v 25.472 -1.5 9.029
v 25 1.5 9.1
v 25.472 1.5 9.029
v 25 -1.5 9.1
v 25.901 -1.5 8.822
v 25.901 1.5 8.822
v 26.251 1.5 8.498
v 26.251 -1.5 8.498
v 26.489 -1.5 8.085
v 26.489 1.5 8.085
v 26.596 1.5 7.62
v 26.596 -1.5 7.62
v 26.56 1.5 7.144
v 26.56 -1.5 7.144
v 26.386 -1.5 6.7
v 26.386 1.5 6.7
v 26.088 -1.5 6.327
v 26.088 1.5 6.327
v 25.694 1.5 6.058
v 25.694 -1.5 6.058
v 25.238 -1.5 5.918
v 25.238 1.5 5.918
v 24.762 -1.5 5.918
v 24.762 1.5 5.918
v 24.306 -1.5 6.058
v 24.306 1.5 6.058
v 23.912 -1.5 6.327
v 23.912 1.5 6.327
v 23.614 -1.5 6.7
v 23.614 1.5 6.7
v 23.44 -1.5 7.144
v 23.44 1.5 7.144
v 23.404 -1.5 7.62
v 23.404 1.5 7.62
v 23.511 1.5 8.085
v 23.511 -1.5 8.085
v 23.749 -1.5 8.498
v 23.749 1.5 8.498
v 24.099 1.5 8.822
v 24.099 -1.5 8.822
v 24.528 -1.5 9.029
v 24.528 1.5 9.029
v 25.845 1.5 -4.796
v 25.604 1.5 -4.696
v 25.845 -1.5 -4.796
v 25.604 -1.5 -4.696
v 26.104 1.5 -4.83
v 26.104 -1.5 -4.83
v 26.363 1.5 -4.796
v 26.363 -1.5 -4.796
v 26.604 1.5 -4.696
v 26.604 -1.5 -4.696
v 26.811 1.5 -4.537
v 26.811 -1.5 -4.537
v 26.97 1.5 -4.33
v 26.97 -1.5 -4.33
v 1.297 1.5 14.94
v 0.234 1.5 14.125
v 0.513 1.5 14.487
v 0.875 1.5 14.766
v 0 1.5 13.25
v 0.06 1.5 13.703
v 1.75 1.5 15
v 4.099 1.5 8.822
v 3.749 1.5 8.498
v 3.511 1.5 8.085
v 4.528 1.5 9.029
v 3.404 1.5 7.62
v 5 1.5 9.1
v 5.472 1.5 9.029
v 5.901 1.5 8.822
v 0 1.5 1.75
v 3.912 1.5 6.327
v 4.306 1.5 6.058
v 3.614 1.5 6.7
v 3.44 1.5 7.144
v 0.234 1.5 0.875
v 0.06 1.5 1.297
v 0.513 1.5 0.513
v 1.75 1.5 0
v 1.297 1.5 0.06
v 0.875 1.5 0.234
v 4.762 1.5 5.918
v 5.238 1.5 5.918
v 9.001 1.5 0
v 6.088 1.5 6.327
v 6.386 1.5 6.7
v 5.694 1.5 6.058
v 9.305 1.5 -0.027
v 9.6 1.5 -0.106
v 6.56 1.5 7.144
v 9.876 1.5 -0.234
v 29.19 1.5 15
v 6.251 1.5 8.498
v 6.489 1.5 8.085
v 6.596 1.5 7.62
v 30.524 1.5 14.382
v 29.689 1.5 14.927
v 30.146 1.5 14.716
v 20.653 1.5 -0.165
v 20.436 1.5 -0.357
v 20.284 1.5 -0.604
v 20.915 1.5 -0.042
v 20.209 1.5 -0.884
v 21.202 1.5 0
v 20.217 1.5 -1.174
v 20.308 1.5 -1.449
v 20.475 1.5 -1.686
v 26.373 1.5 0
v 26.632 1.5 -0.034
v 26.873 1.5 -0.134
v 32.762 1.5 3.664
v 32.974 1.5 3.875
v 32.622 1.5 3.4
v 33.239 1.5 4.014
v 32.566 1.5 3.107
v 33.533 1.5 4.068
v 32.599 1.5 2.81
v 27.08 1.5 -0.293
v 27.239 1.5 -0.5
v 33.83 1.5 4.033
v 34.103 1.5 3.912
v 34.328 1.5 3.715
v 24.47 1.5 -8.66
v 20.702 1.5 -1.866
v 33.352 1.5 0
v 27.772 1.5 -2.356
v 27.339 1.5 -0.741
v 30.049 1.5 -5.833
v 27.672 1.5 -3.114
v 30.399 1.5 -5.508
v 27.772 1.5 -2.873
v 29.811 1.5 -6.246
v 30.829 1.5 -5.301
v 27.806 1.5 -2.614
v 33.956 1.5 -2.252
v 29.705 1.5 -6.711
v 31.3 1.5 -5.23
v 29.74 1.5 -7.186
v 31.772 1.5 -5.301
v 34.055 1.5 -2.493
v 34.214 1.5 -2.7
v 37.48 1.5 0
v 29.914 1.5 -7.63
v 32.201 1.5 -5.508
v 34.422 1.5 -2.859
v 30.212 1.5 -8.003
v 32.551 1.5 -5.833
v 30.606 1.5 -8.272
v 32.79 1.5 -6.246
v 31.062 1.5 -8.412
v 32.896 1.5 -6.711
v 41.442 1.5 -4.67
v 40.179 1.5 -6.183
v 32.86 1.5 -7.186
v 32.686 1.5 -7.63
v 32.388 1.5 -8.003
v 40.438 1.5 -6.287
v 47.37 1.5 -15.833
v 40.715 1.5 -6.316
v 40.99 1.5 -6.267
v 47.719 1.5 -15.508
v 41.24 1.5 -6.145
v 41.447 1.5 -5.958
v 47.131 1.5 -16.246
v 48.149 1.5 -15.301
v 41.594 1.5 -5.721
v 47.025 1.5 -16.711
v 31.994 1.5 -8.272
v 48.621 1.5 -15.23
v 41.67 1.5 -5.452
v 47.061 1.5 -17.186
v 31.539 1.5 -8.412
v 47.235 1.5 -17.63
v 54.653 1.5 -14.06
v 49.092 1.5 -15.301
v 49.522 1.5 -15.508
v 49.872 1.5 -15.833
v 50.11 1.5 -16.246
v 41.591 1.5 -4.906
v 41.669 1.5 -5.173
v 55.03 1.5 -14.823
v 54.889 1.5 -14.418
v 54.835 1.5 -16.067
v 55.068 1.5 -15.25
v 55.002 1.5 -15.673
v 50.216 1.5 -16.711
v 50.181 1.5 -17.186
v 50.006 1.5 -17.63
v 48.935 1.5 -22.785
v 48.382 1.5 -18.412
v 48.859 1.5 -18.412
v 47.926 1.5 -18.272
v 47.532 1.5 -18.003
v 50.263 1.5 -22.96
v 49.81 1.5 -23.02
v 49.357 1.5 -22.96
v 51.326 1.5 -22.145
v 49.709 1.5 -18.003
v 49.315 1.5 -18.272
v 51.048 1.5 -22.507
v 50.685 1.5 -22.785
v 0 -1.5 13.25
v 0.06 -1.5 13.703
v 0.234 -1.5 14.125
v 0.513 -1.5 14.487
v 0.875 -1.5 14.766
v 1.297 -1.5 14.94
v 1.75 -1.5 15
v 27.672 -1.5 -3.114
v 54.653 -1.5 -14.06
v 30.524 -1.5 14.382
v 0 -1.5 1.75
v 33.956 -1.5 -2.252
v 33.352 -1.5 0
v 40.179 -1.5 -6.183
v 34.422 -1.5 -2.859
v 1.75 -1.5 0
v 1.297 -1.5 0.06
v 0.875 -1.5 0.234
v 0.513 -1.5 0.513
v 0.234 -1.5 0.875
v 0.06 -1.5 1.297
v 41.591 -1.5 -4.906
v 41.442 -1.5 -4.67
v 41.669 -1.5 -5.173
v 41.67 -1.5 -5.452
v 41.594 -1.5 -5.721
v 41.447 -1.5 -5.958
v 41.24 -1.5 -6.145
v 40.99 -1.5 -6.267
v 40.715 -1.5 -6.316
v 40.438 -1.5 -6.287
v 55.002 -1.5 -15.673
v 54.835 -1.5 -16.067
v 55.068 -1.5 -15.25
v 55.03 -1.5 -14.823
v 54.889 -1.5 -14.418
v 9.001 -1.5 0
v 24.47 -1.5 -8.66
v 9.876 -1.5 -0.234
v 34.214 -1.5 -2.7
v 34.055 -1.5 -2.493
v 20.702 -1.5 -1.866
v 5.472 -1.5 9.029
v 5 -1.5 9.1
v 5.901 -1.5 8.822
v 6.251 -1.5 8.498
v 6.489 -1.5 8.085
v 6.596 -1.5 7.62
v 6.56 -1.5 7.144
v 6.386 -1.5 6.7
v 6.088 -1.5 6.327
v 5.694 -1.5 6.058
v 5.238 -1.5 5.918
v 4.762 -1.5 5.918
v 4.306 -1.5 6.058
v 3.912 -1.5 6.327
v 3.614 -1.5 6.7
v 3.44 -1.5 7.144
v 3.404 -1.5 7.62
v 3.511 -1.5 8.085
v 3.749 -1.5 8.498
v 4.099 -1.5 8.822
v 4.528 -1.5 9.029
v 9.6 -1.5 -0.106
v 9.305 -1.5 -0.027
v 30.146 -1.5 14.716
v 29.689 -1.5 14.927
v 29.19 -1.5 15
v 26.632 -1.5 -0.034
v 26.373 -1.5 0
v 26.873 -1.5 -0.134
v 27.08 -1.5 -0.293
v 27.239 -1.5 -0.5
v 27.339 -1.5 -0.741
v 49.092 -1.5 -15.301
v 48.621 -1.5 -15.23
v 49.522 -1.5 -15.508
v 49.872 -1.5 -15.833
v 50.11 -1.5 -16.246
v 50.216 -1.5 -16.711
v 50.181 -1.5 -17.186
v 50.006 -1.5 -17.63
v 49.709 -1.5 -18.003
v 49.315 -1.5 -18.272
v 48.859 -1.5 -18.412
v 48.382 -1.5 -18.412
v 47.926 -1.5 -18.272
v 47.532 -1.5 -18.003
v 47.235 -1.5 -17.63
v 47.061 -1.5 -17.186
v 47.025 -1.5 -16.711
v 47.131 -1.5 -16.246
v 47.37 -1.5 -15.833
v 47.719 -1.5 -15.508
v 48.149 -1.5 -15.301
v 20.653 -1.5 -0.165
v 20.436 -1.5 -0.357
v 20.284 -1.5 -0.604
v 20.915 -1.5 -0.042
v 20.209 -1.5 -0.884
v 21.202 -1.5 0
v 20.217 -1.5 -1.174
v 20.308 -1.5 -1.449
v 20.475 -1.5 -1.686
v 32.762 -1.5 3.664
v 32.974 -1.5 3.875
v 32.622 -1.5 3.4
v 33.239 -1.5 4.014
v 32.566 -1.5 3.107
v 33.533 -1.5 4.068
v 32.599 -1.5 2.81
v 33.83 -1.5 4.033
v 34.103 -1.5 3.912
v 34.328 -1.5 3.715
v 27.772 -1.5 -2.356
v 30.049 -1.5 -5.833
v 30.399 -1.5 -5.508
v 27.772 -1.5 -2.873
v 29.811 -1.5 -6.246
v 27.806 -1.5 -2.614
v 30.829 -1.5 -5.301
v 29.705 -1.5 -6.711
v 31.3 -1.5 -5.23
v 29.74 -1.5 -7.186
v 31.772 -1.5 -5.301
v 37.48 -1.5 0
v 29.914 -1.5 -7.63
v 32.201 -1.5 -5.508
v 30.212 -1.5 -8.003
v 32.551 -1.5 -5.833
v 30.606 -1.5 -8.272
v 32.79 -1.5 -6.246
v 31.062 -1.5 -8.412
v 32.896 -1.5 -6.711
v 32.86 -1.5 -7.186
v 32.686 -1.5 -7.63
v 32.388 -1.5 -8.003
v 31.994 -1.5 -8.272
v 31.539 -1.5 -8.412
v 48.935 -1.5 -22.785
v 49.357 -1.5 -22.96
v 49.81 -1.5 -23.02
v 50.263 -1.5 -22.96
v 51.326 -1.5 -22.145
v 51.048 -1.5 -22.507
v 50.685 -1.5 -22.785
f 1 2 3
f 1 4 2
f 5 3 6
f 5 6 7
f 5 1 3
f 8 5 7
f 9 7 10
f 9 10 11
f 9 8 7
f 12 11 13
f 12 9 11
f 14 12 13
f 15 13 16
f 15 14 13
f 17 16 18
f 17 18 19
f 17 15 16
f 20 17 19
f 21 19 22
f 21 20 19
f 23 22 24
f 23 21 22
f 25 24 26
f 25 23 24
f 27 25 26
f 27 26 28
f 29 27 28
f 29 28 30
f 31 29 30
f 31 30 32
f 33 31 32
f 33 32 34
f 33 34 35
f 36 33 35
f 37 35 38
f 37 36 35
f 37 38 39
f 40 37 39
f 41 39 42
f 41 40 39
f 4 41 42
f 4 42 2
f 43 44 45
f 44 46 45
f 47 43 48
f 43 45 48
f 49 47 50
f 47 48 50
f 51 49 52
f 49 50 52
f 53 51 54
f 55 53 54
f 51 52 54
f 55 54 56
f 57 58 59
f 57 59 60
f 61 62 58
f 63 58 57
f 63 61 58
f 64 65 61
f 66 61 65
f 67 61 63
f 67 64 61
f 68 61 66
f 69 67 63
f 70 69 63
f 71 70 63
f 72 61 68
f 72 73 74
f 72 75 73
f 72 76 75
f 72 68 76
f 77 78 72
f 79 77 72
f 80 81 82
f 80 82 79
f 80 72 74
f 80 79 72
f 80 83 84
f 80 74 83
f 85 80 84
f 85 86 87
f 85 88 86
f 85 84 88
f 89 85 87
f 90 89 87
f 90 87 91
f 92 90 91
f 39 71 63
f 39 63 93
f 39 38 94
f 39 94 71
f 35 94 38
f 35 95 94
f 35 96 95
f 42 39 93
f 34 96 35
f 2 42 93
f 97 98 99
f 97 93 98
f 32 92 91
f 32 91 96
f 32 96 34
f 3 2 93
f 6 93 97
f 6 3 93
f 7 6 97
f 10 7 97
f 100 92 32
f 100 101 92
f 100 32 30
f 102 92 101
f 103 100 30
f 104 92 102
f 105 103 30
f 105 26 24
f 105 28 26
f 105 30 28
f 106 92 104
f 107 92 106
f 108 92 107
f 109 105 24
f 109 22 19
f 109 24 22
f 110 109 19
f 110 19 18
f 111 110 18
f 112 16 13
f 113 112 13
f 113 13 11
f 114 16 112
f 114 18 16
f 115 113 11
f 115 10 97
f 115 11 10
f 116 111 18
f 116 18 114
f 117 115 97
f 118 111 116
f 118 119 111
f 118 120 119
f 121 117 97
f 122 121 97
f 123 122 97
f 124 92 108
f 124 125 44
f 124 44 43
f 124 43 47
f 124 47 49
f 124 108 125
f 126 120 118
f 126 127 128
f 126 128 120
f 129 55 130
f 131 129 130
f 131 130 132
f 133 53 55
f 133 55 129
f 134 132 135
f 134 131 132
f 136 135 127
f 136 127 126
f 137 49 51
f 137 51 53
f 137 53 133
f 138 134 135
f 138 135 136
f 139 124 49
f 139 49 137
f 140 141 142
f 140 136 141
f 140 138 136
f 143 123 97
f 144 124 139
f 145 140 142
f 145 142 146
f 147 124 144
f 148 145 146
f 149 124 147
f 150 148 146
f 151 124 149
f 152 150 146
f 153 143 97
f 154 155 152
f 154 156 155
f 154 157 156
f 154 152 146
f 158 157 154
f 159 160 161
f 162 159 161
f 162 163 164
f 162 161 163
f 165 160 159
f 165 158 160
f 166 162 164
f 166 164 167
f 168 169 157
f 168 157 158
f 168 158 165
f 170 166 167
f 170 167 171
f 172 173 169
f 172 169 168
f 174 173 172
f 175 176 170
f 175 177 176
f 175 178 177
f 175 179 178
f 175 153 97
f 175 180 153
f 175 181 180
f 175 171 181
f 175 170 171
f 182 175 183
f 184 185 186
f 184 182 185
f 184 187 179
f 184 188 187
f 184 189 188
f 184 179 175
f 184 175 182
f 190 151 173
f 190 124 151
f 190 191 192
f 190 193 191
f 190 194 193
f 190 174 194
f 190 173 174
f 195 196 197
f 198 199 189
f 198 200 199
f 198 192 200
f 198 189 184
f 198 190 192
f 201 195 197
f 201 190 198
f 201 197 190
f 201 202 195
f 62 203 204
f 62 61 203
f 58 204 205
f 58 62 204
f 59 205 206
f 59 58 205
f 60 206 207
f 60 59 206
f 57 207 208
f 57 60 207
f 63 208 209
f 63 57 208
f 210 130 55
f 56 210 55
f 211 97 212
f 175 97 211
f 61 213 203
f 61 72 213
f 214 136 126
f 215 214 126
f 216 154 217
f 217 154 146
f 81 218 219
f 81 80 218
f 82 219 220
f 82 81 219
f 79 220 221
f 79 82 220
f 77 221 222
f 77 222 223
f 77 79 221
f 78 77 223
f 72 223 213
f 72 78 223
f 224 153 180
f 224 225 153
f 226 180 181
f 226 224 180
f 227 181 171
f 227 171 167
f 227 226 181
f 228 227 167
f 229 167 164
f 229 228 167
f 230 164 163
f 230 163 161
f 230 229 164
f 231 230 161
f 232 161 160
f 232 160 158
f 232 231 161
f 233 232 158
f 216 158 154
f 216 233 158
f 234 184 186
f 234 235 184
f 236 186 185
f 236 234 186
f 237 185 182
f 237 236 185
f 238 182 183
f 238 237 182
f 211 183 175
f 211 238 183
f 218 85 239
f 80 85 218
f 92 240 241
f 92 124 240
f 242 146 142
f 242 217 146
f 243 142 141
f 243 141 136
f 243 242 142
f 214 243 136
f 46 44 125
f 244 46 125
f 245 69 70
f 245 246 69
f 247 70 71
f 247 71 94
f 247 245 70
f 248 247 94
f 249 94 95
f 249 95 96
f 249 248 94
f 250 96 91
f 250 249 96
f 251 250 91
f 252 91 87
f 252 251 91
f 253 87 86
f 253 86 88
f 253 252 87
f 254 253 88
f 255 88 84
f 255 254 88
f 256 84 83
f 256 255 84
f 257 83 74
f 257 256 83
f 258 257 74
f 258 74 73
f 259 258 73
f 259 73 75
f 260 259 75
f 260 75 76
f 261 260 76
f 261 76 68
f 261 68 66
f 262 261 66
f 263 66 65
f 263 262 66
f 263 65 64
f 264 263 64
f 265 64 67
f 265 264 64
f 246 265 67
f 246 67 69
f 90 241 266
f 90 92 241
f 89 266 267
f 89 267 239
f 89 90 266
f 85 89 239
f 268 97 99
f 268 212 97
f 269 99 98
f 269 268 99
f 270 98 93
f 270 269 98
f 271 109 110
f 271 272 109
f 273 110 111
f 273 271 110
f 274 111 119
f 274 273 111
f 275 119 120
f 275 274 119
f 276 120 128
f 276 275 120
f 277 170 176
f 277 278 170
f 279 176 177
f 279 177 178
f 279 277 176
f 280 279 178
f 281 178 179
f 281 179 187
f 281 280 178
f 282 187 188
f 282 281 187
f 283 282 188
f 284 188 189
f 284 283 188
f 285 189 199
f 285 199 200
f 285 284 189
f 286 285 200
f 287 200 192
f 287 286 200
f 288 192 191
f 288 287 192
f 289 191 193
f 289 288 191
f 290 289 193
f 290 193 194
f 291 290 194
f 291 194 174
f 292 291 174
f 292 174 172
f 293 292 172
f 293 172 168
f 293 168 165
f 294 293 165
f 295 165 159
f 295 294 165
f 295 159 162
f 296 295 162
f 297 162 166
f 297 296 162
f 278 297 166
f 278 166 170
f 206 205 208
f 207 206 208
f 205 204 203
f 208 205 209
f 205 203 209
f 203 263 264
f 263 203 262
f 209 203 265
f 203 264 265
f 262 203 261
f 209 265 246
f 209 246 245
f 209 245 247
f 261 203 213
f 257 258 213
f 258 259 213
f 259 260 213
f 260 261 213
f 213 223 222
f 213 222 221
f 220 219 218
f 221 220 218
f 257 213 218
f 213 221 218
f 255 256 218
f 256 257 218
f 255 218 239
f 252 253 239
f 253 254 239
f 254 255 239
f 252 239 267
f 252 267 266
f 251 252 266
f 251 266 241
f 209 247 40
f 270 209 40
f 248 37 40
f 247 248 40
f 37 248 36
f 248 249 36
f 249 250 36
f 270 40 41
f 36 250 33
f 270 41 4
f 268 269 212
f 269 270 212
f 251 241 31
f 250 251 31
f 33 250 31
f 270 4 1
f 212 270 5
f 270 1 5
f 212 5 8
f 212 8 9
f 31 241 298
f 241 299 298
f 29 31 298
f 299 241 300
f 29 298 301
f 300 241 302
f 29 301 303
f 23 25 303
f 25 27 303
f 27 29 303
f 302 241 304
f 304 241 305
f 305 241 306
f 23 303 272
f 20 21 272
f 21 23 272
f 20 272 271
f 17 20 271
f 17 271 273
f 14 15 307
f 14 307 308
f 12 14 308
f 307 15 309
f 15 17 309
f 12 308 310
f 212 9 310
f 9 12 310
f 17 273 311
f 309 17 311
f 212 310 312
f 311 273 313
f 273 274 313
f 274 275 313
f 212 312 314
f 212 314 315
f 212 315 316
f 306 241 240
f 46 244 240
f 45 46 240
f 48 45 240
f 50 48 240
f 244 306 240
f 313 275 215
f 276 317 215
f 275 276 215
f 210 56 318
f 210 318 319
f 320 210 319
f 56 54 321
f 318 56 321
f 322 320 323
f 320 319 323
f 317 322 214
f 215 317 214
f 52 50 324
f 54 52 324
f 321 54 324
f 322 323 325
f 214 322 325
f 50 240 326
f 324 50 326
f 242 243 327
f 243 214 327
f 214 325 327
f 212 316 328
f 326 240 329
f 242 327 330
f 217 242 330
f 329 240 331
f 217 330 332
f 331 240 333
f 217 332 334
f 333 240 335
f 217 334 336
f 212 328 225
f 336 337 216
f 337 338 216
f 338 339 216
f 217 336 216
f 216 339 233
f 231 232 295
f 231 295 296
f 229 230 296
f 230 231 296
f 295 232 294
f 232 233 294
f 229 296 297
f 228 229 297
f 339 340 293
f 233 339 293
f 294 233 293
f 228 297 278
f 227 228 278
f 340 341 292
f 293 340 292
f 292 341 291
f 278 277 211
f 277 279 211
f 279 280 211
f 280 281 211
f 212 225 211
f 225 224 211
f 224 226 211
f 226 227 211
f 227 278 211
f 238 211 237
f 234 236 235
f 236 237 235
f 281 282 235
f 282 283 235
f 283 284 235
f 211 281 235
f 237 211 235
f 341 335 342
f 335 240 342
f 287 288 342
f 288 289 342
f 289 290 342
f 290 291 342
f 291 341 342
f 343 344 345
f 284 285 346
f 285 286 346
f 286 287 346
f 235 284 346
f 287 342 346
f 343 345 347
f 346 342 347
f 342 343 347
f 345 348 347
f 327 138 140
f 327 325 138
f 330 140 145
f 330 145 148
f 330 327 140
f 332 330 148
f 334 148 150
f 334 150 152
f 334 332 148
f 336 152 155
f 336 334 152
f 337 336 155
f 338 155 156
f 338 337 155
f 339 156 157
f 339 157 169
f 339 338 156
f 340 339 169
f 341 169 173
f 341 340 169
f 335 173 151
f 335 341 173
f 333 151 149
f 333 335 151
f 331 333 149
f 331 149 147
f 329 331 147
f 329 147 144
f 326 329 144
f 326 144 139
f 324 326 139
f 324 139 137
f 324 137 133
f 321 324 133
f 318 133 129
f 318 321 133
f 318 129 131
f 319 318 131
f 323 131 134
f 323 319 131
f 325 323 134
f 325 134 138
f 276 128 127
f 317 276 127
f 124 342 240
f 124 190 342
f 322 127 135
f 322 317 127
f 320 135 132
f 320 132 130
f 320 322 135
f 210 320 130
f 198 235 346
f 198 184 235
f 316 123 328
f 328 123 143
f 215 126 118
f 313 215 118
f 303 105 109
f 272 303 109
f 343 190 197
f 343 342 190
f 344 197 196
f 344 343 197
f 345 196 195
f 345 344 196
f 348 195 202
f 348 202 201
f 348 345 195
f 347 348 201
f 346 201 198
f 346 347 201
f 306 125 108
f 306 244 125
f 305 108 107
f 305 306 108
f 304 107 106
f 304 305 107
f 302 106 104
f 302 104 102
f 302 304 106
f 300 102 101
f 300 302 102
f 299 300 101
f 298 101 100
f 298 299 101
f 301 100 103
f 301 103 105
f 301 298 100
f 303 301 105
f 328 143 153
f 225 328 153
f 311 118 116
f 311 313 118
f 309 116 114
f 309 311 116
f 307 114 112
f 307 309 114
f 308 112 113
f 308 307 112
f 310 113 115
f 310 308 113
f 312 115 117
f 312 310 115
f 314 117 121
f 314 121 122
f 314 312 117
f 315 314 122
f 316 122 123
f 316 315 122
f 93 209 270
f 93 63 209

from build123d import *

# Parameters (mm, degrees)
SKETCH_2_R          = 1.6
EXTRUDE_1_DEPTH     = 1.5
CUT_EXTRUDE_1_DEPTH = 3
FILLET_1_R          = 1
FILLET_2_R          = 1.75


with BuildPart() as part:
    # ｽｹｯﾁ2 → ﾎﾞｽ - 押し出し1 (new, symmetric)
    with BuildSketch(Plane(origin=(0, 0, 0), x_dir=(1, 0, 0), z_dir=(0, 1, 0))):
        Polygon((24.47, 8.660254038), (9.47, 0), (0, 0), (0, -15), (30, -15), (55.450762114, 15), (50.450762114, 23.660254038), align=None)
        with Locations(Location((48.620635095, 16.830127019, 0), (0, 0, 270))):
            Circle(SKETCH_2_R, mode=Mode.SUBTRACT)
        with Locations(Location((25, -7.5, 0), (0, 0, 270))):
            Circle(SKETCH_2_R, mode=Mode.SUBTRACT)
        with Locations(Location((31.300127019, 6.830127019, 0), (0, 0, 270))):
            Circle(SKETCH_2_R, mode=Mode.SUBTRACT)
        with Locations(Location((5, -7.5, 0), (0, 0, 270))):
            Circle(SKETCH_2_R, mode=Mode.SUBTRACT)
    extrude(amount=EXTRUDE_1_DEPTH, both=True)

    # ｽｹｯﾁ3 → ｶｯﾄ - 押し出し1 (cut)
    with BuildSketch(Plane(origin=(0, 1.5, 0), x_dir=(1, 0, 0), z_dir=(0, 1, 0))):
        Polygon((26.47, 5.196152423), (17.47, 0), (27.140628594, 0), (27.879009742, 2.755675961), align=None)
        Polygon((33.352285677, 0), (37.479868618, 0), (45.169472556, 9.064094706), (34.062793268, 2.651650429), align=None)
        Polygon((31.44676478, -7.111500799), (37.479868618, 0), (33.352285677, 0), align=None)
    extrude(amount=-CUT_EXTRUDE_1_DEPTH, mode=Mode.SUBTRACT)

    # ﾌｨﾚｯﾄ1
    fillet_1_edges = [part.edges().sort_by_distance(p)[0] for p in [
        (27.879009742, 0, -2.755675961),
        (27.140628594, 0, 0),
        (17.47, 0, 0),
        (26.47, 0, -5.196152423),
        (34.062793268, 0, -2.651650429),
        (45.169472556, 0, -9.064094706),
        (31.44676478, 0, 7.111500799),
    ]]
    fillet(fillet_1_edges, radius=FILLET_1_R)

    # ﾌｨﾚｯﾄ2
    fillet_2_edges = [part.edges().sort_by_distance(p)[0] for p in [
        (50.450762114, 0, -23.660254038),
        (55.450762114, 0, -15),
        (30, 0, 15),
        (0, 0, 15),
        (0, 0, 0),
        (9.47, 0, 0),
    ]]
    fillet(fillet_2_edges, radius=FILLET_2_R)


solid = part.part
